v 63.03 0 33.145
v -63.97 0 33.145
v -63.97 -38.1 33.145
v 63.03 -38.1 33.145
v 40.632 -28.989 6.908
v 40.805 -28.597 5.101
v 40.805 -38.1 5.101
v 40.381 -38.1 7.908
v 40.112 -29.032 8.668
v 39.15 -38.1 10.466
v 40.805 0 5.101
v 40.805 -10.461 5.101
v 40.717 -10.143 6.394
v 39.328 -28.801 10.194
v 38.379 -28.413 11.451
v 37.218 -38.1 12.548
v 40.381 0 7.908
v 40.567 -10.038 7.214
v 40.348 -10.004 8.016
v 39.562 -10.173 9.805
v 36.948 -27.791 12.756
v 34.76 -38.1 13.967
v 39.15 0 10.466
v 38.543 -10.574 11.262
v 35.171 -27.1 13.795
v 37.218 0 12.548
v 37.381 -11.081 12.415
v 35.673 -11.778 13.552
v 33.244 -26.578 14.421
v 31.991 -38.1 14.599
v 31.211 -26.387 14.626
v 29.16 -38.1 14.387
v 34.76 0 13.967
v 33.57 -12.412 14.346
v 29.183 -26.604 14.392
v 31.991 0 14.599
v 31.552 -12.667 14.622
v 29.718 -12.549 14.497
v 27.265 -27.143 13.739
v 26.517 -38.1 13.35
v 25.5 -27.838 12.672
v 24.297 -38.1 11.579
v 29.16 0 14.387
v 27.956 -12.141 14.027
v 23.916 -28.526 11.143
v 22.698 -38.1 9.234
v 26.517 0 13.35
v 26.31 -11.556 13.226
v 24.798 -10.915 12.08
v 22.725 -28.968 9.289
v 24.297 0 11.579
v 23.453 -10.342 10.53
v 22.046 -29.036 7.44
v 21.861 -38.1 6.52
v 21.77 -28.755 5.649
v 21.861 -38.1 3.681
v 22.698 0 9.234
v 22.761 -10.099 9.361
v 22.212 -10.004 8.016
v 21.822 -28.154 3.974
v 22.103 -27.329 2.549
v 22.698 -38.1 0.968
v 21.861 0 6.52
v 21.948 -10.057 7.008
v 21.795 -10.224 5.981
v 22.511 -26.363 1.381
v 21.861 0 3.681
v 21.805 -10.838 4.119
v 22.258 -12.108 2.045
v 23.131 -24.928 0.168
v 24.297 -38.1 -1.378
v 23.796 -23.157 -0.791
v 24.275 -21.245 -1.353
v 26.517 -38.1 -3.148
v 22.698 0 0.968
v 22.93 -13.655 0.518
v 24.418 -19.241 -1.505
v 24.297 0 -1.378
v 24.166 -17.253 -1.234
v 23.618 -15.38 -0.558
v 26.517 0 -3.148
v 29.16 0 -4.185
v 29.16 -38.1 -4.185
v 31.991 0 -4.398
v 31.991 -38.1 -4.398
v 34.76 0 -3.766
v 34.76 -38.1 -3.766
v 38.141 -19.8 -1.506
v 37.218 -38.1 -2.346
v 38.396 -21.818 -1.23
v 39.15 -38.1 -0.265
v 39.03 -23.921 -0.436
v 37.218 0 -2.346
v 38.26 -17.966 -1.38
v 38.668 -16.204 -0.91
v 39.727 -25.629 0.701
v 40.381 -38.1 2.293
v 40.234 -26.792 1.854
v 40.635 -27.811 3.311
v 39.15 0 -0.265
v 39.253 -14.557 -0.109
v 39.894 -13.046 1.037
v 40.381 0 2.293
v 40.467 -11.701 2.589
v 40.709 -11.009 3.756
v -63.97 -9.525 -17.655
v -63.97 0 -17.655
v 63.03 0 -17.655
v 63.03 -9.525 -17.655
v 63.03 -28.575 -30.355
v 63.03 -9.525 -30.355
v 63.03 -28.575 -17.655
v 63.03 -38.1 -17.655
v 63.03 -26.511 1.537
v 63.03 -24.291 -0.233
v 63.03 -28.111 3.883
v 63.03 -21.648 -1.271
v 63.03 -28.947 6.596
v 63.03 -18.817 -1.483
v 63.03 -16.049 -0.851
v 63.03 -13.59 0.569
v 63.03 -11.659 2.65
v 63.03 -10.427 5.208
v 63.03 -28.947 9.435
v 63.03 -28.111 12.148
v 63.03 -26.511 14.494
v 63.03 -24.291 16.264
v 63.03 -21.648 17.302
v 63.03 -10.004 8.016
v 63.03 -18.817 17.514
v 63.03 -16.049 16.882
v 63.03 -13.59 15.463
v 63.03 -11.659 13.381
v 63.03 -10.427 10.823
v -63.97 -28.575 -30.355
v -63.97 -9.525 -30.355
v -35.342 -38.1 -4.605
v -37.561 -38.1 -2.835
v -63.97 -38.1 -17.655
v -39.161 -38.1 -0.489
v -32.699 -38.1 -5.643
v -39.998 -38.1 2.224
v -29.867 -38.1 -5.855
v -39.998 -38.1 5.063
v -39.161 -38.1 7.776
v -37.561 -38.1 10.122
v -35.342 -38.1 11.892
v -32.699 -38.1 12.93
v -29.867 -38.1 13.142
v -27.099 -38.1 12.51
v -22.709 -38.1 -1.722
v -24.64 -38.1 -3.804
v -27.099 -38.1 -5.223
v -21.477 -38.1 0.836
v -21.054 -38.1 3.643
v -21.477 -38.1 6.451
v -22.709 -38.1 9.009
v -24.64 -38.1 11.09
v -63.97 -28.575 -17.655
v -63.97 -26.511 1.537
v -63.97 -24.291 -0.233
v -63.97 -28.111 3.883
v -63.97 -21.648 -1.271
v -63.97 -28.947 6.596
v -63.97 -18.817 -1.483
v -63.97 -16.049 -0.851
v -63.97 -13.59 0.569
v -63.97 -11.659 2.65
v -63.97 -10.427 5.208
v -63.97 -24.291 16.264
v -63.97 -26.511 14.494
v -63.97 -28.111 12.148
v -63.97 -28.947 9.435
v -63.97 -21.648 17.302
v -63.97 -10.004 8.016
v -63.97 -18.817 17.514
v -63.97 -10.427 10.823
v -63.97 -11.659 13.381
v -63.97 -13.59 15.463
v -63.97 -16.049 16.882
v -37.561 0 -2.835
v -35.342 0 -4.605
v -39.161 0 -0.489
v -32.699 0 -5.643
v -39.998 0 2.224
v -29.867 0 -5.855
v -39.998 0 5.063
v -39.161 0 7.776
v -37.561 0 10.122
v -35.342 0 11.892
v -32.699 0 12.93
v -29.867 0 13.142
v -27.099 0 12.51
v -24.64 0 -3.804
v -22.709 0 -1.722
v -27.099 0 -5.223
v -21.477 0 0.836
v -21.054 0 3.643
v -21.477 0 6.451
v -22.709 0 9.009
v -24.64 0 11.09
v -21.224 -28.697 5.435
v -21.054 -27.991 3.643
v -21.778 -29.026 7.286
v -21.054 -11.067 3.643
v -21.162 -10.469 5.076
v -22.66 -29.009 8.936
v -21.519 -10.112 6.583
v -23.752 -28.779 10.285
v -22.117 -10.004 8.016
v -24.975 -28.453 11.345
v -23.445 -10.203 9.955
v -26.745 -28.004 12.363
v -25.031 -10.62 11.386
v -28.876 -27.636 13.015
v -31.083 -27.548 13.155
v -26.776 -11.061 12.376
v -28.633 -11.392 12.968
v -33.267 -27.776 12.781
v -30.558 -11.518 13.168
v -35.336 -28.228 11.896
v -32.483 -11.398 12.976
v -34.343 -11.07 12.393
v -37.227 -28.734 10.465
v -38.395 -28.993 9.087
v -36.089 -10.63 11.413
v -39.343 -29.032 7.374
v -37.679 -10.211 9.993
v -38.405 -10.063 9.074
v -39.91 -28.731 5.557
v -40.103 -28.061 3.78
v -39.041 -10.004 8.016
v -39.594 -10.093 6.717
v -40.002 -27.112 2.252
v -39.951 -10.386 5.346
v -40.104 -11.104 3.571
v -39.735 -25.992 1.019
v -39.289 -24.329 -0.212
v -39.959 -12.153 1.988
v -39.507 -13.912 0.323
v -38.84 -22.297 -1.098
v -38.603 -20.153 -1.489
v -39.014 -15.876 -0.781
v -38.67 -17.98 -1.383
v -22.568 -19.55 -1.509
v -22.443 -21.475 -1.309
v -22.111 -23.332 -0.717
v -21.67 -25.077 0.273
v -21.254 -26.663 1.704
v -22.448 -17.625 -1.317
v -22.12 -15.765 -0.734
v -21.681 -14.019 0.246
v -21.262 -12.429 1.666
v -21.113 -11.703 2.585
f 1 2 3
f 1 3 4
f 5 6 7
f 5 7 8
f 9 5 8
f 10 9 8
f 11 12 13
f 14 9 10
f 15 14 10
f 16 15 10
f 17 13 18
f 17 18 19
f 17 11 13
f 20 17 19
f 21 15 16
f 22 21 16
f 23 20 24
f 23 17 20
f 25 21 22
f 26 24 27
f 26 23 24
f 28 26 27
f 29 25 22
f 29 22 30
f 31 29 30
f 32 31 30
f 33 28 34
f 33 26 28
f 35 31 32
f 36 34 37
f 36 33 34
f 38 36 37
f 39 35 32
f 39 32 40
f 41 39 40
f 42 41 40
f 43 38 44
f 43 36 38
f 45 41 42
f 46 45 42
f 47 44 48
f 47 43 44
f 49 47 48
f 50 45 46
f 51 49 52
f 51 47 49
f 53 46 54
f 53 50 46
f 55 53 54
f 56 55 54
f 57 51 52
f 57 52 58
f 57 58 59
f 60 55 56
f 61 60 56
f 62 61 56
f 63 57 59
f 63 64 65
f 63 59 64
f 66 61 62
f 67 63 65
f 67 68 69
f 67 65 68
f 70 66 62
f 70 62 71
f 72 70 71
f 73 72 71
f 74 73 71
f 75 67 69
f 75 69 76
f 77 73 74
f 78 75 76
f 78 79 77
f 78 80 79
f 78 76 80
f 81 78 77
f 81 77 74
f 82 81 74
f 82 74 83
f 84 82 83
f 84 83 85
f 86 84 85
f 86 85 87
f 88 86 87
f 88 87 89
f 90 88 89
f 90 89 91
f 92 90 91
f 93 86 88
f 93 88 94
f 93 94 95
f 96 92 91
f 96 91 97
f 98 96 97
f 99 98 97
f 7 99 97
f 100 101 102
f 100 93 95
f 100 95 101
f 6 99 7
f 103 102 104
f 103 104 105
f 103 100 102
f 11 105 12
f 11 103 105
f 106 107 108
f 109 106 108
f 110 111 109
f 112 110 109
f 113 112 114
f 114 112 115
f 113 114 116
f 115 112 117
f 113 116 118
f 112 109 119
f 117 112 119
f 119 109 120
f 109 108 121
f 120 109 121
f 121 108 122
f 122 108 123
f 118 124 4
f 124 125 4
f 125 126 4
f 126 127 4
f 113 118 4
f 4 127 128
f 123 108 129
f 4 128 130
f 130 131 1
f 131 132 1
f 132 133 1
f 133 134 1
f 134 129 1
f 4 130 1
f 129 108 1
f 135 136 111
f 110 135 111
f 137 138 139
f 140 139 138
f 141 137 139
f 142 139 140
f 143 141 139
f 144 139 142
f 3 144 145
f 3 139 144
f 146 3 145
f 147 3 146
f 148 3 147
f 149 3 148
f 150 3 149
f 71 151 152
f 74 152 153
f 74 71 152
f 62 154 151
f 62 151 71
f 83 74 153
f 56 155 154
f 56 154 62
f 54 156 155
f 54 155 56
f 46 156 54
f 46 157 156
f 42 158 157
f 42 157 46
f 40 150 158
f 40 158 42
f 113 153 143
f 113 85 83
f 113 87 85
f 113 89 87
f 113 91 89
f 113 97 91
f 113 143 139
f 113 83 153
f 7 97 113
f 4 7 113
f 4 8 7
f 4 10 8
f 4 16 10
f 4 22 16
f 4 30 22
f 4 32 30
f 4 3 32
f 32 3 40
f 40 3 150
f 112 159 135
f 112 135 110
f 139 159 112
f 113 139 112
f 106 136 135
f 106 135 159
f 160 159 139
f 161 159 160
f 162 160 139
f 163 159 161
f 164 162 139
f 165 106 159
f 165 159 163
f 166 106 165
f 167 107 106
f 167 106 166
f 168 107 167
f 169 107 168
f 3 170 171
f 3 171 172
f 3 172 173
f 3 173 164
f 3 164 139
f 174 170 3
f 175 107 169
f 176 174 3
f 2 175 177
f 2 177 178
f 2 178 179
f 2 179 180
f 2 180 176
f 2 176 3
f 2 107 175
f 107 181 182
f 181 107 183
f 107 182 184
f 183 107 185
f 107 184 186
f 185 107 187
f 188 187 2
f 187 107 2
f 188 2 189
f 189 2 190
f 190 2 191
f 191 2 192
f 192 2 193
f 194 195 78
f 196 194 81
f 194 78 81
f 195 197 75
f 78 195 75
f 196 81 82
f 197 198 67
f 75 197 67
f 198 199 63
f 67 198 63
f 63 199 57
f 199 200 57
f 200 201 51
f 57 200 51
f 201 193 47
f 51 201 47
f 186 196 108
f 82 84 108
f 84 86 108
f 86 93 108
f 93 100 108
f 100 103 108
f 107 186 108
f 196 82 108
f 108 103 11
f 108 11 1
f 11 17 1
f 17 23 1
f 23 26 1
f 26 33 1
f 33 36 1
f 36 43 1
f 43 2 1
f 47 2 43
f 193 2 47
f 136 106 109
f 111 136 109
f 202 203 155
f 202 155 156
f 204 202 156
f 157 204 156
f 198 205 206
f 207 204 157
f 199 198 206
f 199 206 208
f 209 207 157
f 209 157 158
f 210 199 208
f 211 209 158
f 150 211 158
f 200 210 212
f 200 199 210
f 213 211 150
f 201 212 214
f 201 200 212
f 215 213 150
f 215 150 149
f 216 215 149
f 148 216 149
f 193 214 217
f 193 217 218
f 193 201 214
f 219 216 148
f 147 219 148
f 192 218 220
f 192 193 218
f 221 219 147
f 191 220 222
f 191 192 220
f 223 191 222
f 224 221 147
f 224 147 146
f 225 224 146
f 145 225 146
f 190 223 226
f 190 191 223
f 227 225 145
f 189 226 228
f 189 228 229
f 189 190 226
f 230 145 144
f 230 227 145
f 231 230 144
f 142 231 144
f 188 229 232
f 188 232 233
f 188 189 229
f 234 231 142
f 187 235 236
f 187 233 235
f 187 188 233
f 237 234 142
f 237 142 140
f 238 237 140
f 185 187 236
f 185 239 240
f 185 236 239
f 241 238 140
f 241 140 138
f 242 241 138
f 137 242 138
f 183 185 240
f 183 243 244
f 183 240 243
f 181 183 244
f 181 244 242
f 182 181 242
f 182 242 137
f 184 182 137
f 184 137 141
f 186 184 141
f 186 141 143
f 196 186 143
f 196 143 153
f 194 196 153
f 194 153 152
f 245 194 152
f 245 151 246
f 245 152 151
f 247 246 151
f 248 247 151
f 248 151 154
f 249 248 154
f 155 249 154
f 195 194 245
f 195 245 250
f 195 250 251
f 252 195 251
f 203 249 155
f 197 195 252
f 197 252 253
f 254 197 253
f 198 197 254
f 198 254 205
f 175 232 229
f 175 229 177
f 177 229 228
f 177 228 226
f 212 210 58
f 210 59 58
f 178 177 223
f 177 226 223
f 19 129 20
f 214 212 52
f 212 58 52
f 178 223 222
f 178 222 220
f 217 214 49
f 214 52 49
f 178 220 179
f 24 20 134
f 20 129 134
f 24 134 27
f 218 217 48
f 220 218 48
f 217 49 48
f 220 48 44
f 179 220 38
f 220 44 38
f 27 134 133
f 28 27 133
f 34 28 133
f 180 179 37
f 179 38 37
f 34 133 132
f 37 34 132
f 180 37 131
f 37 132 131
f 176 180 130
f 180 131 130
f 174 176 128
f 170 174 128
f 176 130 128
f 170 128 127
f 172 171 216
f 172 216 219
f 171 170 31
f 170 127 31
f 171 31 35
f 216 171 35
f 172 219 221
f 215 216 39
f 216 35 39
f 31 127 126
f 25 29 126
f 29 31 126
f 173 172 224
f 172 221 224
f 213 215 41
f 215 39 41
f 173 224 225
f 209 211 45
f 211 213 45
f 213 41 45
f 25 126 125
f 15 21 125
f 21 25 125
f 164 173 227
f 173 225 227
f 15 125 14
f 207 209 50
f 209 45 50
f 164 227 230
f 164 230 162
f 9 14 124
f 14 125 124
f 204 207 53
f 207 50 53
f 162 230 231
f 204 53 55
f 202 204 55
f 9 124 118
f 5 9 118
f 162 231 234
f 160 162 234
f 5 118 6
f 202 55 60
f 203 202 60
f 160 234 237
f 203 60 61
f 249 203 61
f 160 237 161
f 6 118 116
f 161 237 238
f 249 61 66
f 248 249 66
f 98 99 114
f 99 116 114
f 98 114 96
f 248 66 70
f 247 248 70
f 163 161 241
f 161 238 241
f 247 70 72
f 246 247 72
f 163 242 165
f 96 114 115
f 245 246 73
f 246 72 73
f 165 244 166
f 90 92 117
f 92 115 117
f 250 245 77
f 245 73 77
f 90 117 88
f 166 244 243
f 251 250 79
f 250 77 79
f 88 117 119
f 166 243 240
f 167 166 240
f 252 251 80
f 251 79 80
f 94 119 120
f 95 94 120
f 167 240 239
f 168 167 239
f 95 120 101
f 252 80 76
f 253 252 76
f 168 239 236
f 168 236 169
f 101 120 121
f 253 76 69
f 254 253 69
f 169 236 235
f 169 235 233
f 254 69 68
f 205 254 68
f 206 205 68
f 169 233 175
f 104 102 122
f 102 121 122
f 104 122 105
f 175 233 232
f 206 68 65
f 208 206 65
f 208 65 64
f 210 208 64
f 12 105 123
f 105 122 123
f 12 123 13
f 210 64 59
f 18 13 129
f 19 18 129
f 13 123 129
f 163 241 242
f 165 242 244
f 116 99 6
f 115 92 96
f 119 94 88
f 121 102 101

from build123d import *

# Parameters (mm, degrees)
F0_W          = 127
F0_H          = 50.8
F0_R          = 9.525
F1_DEPTH      = 38.1
F2_START      = 9.525
F0_H_2        = 12.7
F2_DEPTH      = 19.05
F3_R          = 9.525
F4_DEPTH      = 74.93
F4_DEPTH_BACK = 90.678


with BuildPart() as f1:
    # F0 (on Front) → F1 (new body)
    with BuildSketch(Plane.XZ):
        with Locations((-0.4703439772, 7.7449264884)):
            Rectangle(F0_W, F0_H)
        with Locations((-30.579155311, 3.6434426438)):
            Circle(F0_R, mode=Mode.SUBTRACT)
        with Locations((31.2796560228, 5.1008197479)):
            Circle(F0_R, mode=Mode.SUBTRACT)
    extrude(amount=F1_DEPTH)

    # F0 (on Front) → F2 (join)
    with BuildSketch(Plane.XZ.offset(F2_START)):
        with Locations((-0.4703439772, -24.0050735116)):
            Rectangle(F0_W, F0_H_2)
    extrude(amount=F2_DEPTH)

    # F3 (on Right) → F4 (cut, two sides)
    with BuildSketch(Plane.YZ) as f4_sk:
        with Locations((-19.5288527757, 8.0155739561)):
            Circle(F3_R)
    extrude(amount=F4_DEPTH, mode=Mode.SUBTRACT)
    extrude(f4_sk.sketch, amount=-F4_DEPTH_BACK, mode=Mode.SUBTRACT)


solid = f1.part
